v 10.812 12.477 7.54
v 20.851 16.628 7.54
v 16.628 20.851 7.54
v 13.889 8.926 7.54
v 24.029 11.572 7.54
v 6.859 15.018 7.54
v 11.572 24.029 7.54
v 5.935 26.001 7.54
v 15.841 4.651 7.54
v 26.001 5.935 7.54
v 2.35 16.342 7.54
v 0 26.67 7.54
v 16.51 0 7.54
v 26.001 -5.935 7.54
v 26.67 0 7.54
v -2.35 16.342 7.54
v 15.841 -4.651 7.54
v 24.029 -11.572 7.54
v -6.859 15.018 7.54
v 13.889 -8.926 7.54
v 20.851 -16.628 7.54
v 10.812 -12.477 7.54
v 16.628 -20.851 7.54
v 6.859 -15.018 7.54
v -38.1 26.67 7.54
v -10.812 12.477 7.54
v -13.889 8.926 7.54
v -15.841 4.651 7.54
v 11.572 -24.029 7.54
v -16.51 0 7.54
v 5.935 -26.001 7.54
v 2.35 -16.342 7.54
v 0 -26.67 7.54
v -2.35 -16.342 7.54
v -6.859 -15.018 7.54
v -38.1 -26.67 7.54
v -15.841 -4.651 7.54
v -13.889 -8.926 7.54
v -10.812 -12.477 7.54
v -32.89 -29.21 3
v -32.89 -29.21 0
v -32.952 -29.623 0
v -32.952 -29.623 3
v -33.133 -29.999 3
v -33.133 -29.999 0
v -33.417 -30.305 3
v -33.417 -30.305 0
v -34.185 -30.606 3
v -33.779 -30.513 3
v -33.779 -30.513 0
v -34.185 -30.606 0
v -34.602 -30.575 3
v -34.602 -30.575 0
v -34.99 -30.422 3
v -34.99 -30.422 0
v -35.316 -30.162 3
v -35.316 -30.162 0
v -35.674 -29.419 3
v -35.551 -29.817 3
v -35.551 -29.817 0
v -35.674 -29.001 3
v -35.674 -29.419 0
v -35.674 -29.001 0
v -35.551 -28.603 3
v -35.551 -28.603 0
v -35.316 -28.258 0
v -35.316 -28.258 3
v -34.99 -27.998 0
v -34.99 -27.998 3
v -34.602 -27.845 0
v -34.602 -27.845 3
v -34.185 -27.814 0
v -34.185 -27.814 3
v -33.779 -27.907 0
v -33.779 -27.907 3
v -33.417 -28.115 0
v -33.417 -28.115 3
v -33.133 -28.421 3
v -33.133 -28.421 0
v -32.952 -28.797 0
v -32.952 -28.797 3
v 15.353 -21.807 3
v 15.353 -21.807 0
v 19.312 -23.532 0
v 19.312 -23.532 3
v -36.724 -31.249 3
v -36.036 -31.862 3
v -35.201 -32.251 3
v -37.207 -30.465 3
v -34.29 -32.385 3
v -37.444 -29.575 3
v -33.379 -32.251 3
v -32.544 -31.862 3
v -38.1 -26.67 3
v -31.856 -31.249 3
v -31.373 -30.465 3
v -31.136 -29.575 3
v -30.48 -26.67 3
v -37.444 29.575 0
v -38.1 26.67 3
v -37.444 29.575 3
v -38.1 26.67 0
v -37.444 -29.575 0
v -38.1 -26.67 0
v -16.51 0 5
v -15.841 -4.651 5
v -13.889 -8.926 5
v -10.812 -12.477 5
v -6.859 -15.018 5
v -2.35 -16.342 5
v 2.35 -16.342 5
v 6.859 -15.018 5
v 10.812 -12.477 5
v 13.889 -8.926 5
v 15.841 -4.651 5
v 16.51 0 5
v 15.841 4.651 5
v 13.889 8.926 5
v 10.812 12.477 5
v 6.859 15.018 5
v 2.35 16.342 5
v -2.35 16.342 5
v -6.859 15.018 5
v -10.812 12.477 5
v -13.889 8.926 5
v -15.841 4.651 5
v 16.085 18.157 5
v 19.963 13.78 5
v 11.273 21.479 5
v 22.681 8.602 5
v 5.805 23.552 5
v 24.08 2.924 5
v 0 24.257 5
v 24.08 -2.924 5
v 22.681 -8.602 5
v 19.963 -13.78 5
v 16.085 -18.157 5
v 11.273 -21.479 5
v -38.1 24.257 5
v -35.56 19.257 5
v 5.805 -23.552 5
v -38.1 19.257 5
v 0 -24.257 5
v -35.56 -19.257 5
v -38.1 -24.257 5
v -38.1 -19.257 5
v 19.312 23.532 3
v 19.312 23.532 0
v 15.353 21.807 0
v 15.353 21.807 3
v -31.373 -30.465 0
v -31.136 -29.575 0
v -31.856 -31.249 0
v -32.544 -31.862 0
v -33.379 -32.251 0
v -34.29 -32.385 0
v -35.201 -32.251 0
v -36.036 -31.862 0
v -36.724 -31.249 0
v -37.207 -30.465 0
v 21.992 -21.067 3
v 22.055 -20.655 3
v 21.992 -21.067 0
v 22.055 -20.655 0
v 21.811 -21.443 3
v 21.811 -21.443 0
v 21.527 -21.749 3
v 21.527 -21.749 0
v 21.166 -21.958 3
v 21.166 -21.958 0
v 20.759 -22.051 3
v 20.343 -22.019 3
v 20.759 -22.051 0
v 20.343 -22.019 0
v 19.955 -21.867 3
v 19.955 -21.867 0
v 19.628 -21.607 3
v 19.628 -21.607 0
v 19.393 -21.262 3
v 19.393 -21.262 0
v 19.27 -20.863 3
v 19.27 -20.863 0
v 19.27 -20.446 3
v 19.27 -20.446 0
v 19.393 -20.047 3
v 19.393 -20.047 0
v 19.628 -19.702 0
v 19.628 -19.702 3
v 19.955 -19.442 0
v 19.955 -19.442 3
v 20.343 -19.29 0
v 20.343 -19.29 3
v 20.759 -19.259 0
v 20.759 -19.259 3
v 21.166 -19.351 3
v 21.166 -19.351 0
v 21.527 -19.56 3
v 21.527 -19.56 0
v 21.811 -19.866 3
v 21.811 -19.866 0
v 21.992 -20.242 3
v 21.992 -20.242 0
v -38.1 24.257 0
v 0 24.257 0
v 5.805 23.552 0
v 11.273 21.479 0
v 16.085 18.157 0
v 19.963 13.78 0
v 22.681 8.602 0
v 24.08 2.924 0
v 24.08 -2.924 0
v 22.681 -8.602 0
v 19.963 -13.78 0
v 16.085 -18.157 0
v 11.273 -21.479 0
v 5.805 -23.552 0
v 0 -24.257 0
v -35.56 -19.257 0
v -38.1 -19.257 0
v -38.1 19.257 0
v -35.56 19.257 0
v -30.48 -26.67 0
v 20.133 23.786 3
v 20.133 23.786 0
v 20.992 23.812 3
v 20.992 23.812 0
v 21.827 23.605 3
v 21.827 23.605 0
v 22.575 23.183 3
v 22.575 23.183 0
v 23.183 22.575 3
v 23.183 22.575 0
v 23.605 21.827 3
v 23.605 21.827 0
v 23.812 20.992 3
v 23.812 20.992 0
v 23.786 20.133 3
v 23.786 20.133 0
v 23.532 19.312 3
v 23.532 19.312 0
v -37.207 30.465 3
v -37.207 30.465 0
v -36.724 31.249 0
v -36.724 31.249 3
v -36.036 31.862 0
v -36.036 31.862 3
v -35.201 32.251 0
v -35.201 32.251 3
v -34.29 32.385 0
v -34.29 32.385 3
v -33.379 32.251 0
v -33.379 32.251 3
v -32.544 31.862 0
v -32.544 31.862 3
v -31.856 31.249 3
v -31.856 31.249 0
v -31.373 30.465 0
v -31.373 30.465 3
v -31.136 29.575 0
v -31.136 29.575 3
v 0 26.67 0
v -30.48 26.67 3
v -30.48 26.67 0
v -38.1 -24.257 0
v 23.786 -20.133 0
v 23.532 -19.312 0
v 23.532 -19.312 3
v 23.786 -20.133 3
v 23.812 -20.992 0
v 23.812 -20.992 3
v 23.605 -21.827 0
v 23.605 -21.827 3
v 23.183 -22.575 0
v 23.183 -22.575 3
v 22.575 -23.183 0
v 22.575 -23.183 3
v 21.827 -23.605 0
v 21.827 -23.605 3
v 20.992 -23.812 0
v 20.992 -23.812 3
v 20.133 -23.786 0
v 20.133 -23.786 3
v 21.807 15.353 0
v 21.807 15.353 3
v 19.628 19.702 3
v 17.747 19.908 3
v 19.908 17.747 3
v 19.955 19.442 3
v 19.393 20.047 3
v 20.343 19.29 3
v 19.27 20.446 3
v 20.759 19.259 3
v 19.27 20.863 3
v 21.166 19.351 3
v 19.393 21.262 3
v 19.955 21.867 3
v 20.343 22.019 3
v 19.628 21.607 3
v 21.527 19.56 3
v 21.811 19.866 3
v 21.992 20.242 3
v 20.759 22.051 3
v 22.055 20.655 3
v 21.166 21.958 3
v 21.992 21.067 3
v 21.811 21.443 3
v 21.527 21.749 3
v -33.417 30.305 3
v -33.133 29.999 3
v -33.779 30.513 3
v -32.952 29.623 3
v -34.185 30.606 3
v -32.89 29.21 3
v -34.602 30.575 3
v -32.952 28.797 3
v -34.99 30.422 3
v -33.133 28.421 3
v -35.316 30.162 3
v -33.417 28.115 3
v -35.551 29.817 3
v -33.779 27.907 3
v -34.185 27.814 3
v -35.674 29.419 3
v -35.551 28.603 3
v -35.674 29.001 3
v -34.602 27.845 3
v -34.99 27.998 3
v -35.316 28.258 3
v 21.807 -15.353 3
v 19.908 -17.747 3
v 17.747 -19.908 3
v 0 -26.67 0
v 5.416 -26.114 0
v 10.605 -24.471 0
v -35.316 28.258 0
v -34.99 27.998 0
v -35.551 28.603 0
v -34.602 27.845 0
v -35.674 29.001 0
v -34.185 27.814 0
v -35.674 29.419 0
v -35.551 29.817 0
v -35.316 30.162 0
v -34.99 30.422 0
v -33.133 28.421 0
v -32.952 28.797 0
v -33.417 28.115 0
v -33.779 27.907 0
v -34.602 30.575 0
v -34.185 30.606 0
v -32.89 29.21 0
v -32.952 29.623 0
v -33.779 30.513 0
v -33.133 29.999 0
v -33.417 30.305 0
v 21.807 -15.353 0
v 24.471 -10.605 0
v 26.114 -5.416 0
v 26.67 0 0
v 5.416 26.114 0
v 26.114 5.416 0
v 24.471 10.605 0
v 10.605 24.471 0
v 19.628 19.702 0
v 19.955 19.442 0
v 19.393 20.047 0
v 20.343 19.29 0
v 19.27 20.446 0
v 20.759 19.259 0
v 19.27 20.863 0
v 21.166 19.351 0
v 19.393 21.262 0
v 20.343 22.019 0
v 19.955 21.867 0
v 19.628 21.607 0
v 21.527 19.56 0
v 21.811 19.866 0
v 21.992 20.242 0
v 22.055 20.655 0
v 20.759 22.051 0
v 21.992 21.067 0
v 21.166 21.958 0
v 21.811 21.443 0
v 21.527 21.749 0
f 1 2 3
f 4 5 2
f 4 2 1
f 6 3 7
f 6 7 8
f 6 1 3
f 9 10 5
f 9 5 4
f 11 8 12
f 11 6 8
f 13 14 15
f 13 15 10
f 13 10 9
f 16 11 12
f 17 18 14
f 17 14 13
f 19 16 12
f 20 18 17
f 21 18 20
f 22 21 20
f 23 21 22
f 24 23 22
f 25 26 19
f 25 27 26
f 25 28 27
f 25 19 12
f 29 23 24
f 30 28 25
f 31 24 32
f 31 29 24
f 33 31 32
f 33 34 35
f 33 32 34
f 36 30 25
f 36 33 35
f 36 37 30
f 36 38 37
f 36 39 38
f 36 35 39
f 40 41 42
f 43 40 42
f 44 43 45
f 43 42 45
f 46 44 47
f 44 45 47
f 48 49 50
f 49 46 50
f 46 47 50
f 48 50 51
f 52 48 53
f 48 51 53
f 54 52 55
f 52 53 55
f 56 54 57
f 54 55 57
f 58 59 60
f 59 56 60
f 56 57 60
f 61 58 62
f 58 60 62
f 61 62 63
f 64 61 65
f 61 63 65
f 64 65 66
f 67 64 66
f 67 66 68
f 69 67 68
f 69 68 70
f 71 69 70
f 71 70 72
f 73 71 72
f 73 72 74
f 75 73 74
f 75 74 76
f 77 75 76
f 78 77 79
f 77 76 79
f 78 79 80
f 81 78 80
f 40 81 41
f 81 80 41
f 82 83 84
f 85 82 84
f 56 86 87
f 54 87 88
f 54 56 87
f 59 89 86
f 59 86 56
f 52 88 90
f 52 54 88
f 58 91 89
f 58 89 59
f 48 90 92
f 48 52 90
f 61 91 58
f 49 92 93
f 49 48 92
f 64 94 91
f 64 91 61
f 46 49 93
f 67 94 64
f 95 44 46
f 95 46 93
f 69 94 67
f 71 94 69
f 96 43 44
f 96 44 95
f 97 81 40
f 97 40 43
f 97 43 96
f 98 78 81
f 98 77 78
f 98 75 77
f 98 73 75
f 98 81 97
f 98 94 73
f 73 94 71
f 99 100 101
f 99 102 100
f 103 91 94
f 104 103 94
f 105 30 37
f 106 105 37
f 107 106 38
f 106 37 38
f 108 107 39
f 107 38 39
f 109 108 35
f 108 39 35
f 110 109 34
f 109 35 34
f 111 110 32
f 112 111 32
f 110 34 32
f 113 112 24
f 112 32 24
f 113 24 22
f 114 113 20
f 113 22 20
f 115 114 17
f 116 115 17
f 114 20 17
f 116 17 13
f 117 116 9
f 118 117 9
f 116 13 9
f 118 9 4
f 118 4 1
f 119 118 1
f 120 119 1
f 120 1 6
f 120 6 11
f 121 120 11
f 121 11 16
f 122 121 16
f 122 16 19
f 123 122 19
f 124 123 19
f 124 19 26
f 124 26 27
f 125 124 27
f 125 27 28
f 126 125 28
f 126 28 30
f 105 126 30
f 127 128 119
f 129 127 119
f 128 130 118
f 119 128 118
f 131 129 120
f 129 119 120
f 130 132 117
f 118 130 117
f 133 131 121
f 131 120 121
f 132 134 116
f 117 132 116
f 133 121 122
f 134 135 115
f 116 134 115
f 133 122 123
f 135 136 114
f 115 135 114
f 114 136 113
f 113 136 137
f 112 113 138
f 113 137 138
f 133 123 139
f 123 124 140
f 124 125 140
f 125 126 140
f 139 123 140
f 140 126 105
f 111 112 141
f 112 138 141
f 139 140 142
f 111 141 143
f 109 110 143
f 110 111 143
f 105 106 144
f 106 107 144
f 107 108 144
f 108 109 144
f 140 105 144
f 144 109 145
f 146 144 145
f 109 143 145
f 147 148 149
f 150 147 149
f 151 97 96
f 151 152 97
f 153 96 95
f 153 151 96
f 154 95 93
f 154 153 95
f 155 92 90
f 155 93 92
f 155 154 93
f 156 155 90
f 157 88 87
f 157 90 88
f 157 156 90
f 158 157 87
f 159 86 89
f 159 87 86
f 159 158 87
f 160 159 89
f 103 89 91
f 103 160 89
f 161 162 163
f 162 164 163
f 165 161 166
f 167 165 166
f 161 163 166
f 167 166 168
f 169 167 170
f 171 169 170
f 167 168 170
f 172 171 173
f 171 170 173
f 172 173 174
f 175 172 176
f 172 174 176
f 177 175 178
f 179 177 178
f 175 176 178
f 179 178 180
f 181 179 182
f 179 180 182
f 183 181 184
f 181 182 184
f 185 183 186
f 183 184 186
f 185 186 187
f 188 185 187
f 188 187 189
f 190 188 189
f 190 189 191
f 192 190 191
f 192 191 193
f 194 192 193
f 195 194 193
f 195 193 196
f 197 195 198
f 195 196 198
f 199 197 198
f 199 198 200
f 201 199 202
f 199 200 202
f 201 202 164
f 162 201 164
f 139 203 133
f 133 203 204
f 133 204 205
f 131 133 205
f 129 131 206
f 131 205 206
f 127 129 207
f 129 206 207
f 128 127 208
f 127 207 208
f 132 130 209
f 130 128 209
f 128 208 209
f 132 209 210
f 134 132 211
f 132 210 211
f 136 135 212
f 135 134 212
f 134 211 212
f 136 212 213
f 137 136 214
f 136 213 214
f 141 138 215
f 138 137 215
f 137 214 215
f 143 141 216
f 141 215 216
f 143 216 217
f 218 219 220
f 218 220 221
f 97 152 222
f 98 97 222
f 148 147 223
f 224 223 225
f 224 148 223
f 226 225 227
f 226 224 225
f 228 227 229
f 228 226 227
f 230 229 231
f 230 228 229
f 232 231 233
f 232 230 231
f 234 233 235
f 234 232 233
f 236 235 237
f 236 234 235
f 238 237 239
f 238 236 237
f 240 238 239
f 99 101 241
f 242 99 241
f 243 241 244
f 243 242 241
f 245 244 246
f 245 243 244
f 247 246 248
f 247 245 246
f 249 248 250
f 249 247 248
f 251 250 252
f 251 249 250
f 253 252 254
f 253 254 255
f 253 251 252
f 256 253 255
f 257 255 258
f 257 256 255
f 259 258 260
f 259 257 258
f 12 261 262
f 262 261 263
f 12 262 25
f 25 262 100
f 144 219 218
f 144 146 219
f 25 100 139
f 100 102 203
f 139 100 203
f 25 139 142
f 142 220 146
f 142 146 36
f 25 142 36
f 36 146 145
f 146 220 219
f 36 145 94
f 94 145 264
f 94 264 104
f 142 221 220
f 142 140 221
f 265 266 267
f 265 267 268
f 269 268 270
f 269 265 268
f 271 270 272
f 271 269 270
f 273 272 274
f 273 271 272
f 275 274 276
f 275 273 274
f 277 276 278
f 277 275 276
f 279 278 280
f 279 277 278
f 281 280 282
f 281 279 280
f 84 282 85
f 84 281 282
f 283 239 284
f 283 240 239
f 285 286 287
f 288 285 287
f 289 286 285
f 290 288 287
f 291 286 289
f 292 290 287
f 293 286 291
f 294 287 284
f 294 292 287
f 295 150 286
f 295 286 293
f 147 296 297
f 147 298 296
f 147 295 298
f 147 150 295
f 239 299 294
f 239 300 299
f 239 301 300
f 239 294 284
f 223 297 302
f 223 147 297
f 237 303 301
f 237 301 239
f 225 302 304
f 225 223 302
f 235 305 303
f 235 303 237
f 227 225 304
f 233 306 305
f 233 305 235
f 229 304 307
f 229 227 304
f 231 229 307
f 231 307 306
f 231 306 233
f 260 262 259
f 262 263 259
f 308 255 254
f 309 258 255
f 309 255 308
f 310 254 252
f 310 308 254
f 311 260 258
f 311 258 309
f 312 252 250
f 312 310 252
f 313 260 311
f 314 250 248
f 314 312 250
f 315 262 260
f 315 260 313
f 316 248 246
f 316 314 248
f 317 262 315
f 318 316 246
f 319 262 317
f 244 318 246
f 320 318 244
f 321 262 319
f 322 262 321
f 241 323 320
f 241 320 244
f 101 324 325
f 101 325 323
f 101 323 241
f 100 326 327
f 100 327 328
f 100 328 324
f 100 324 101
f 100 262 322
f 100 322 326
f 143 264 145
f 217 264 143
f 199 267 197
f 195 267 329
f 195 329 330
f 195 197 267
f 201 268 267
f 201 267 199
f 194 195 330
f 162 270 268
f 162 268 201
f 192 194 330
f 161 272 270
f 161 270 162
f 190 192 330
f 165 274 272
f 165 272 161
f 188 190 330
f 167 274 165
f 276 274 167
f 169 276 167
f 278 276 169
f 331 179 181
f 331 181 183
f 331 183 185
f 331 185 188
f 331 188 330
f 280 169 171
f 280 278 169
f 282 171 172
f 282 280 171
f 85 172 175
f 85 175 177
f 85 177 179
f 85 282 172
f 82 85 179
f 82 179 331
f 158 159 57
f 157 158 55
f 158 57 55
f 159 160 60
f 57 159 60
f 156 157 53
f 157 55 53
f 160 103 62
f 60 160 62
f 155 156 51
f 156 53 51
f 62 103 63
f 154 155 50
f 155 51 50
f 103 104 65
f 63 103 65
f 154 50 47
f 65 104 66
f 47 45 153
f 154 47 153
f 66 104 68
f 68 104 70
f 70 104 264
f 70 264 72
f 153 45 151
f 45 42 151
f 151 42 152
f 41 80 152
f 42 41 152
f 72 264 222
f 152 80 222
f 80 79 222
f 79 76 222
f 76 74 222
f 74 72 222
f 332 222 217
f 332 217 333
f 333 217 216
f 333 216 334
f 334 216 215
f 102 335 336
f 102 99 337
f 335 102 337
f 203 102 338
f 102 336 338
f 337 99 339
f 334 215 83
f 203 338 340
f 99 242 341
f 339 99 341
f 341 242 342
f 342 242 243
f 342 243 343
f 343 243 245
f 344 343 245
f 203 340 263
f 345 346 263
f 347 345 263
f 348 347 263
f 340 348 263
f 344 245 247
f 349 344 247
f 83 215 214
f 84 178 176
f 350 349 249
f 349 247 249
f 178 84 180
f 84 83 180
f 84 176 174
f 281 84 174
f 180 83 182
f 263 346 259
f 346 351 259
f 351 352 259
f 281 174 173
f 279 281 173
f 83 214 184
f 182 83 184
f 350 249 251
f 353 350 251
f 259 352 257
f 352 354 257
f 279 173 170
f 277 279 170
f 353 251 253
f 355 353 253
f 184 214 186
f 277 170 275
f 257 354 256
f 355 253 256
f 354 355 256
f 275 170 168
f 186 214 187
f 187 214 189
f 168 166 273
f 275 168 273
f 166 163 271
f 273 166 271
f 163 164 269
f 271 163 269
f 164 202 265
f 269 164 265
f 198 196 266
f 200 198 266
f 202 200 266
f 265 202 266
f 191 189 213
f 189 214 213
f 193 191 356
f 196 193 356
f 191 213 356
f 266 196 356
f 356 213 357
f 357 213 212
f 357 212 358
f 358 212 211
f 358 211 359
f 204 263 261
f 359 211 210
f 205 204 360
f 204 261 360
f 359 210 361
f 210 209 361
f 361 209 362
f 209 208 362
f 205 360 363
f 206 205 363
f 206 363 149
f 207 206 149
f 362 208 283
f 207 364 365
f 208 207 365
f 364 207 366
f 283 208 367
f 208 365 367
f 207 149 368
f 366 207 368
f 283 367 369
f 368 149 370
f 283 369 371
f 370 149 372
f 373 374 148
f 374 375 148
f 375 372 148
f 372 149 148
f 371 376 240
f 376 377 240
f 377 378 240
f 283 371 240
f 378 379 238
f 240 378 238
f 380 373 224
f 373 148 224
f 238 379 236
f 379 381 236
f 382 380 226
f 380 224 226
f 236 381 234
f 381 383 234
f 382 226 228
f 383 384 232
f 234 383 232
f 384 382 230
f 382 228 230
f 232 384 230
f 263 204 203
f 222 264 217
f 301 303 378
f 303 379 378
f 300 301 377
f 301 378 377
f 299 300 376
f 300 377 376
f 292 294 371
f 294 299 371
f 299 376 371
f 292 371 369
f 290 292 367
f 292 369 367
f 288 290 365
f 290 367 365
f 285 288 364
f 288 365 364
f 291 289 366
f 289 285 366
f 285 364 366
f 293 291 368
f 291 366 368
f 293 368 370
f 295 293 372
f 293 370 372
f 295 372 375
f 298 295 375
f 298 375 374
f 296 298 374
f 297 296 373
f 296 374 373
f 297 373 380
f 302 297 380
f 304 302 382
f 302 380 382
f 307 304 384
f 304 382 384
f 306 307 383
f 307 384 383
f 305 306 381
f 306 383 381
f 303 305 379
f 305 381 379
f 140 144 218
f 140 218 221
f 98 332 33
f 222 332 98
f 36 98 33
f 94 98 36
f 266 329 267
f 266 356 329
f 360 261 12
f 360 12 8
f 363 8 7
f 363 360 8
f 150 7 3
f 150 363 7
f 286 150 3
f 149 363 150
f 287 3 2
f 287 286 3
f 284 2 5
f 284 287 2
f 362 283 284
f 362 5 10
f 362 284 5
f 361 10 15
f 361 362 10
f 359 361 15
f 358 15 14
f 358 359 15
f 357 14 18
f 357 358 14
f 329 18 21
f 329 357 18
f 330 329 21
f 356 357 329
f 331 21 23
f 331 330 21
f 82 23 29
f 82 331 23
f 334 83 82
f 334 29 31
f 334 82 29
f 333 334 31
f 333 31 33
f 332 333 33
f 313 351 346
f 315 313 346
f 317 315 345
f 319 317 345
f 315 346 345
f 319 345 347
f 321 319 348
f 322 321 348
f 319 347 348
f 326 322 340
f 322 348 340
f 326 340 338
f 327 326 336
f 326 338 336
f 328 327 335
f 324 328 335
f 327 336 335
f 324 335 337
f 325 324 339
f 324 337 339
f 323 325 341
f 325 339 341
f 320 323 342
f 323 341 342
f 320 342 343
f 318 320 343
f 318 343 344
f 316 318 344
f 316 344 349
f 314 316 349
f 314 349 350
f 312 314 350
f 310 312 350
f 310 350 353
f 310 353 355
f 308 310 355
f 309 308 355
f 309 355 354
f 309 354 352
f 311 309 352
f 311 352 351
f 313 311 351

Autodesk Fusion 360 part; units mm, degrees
sketch "Sketch1" plane through (0, 0, 0) normal (0, 0, 1) x (1, 0, 0)
  line L0 (0, 26.67) -> (-38.1, 26.67)
  line L1 (0, -26.67) -> (-38.1, -26.67)
  line L2 (-38.1, 24.257) -> (0, 24.257)
  line L3 (-38.1, -24.257) -> (0, -24.257)
  line L4 (-38.1, 26.67) -> (-38.1, 24.257)
  line L5 (-38.1, -24.257) -> (-38.1, -26.67)
  arc A0 (0, -26.67) -> (0, 26.67) centre (0, 0) ccw
  arc A1 (0, -24.257) -> (0, 24.257) centre (0, 0) ccw
  dimension "d1" = 53.34
  dimension "d2" = 48.514
  dimension "d3" = 38.1
  dimension "d4" = 38.1
extrude "Extrude1" add sketch "Sketch1" along normal blind 5
sketch "Sketch2" plane through (0, 0, 5) normal (0, 0, 1) x (-1, 0, 0)
  line L0 (38.1, 24.257) -> (38.1, 26.67)
  line L1 (38.1, 26.67) -> (0, 26.67)
  arc A0 (0, 26.67) -> (0, -26.67) centre (0, 0) ccw
  line L2 (0, -26.67) -> (38.1, -26.67)
  line L3 (38.1, -26.67) -> (38.1, -24.257)
  line L4 (38.1, -24.257) -> (0, -24.257)
  arc A1 (0, 24.257) -> (0, -24.257) centre (0, 0) ccw
  line L5 (0, 24.257) -> (38.1, 24.257)
  line L6 (38.1, -26.67) -> (38.1, 26.67)
extrude "Extrude2" add sketch "Sketch2" along normal blind 2.54
sketch "Sketch3" plane through (0, 0, 7.54) normal (0, 0, 1) x (-1, 0, 0)
  line L0 (38.1, -26.67) -> (38.1, 26.67)
  line L1 (38.1, 26.67) -> (0, 26.67)
  arc A0 (0, 26.67) -> (0, -26.67) centre (0, 0) ccw
  line L2 (0, -26.67) -> (38.1, -26.67)
  circle A1 centre (0, 0) radius 16.51
  dimension "d9" = 33.02
extrude "Extrude3" cut sketch "Sketch3" against normal through all contours A1
sketch "Sketch4" plane through (0, 0, 5) normal (0, 0, -1) x (1, 0, 0)
  circle A0 centre (0, 0) radius 16.51
  line L0 (0, 24.257) -> (-38.1, 24.257)
  line L1 (-38.1, 24.257) -> (-38.1, -24.257)
  line L2 (-38.1, -24.257) -> (0, -24.257)
  arc A1 (0, -24.257) -> (0, 24.257) centre (0, 0) ccw
  line L3 (-38.1, 19.257) -> (-35.56, 19.257)
  line L4 (-35.56, 19.257) -> (-35.56, -19.257)
  line L5 (-35.56, -19.257) -> (-38.1, -19.257)
  line L6 (-38.1, -19.257) -> (-38.1, 19.257)
  dimension "d11" = 5
  dimension "d12" = 5
extrude "Extrude4" add sketch "Sketch4" along normal blind 5 contours L1 L3 L4 L5 L6
sketch "Sketch5" plane through (0, 0, 0) normal (0, 0, 1) x (1, 0, 0)
  line L0 (0, 0) -> (30.48, 30.48) construction
  line L1 (0, 0) -> (43.1052, 0) construction
  line L2 (0, 0) -> (33.4313, -33.4313) construction
  line L3 (0, 0) -> (47.279, 0) construction
  circle A0 centre (20.6546, 20.6546) radius 1.4
  circle A1 centre (20.6546, -20.6546) radius 1.4
  circle A2 centre (20.6546, 20.6546) radius 3.175
  line L4 (19.3121, 23.5318) -> (15.3534, 21.8074)
  line L5 (23.5318, 19.3121) -> (21.8074, 15.3534)
  arc A3 (0, -26.67) -> (0, 26.67) centre (0, 0) ccw
  dimension "d15" = 45
  dimension "d16" = 45
  dimension "d17" = 2.8
  dimension "d18" = 2.8
  dimension "d19" = 29.21
  dimension "d20" = 29.21
  dimension "d21" = 6.35
  dimension "d22" = 4.318
extrude "Extrude5" add sketch "Sketch5" along normal blind 3 contours A2 A3 | A2 L4 A3 | A2 L5 A3 picked at (18.4077, 19.9432)
mirror "Mirror1" about plane through (0, 0, 0) normal (0, 1, 0) of "Extrude5"
sketch "Sketch6" plane through (0, 0, 0) normal (0, 0, 1) x (1, 0, 0)
  circle A0 centre (-34.29, -29.21) radius 1.4
  line L0 (-38.1, 26.67) -> (-38.1, -26.67)
  line L1 (-38.1, -26.67) -> (0, -26.67)
  circle A1 centre (-34.29, -29.21) radius 3.175
  line L2 (-37.444, -29.5746) -> (-38.1, -26.67)
  line L3 (-31.136, -29.5746) -> (-30.48, -26.67)
  dimension "d27" = 2.8
  dimension "d28" = 3.81
  dimension "d29" = 2.54
  dimension "d30" = 6.35
extrude "Extrude6" add sketch "Sketch6" along normal blind 3 contours L1 A1 L2 | L1 A1 | L1 A1 L3 picked at (-34.3249, -27.0513)
mirror "Mirror2" about plane through (0, 0, 0) normal (0, 1, 0) of "Extrude6"
sketch "Sketch7" plane through (0, 0, 0) normal (0, 0, 1) x (1, 0, 0)
  line L0 (38.1, -38.1) -> (-38.1, -38.1) construction
  line L1 (-38.1, -38.1) -> (-38.1, 38.1) construction
  line L2 (-38.1, 38.1) -> (38.1, 38.1) construction
  line L3 (38.1, 38.1) -> (38.1, -38.1) construction
  line L4 (38.1, -38.1) -> (-38.1, 38.1) construction
  line L5 (-38.1, -38.1) -> (38.1, 38.1) construction
  dimension "d35" = 76.2
  dimension "d36" = 76.2
